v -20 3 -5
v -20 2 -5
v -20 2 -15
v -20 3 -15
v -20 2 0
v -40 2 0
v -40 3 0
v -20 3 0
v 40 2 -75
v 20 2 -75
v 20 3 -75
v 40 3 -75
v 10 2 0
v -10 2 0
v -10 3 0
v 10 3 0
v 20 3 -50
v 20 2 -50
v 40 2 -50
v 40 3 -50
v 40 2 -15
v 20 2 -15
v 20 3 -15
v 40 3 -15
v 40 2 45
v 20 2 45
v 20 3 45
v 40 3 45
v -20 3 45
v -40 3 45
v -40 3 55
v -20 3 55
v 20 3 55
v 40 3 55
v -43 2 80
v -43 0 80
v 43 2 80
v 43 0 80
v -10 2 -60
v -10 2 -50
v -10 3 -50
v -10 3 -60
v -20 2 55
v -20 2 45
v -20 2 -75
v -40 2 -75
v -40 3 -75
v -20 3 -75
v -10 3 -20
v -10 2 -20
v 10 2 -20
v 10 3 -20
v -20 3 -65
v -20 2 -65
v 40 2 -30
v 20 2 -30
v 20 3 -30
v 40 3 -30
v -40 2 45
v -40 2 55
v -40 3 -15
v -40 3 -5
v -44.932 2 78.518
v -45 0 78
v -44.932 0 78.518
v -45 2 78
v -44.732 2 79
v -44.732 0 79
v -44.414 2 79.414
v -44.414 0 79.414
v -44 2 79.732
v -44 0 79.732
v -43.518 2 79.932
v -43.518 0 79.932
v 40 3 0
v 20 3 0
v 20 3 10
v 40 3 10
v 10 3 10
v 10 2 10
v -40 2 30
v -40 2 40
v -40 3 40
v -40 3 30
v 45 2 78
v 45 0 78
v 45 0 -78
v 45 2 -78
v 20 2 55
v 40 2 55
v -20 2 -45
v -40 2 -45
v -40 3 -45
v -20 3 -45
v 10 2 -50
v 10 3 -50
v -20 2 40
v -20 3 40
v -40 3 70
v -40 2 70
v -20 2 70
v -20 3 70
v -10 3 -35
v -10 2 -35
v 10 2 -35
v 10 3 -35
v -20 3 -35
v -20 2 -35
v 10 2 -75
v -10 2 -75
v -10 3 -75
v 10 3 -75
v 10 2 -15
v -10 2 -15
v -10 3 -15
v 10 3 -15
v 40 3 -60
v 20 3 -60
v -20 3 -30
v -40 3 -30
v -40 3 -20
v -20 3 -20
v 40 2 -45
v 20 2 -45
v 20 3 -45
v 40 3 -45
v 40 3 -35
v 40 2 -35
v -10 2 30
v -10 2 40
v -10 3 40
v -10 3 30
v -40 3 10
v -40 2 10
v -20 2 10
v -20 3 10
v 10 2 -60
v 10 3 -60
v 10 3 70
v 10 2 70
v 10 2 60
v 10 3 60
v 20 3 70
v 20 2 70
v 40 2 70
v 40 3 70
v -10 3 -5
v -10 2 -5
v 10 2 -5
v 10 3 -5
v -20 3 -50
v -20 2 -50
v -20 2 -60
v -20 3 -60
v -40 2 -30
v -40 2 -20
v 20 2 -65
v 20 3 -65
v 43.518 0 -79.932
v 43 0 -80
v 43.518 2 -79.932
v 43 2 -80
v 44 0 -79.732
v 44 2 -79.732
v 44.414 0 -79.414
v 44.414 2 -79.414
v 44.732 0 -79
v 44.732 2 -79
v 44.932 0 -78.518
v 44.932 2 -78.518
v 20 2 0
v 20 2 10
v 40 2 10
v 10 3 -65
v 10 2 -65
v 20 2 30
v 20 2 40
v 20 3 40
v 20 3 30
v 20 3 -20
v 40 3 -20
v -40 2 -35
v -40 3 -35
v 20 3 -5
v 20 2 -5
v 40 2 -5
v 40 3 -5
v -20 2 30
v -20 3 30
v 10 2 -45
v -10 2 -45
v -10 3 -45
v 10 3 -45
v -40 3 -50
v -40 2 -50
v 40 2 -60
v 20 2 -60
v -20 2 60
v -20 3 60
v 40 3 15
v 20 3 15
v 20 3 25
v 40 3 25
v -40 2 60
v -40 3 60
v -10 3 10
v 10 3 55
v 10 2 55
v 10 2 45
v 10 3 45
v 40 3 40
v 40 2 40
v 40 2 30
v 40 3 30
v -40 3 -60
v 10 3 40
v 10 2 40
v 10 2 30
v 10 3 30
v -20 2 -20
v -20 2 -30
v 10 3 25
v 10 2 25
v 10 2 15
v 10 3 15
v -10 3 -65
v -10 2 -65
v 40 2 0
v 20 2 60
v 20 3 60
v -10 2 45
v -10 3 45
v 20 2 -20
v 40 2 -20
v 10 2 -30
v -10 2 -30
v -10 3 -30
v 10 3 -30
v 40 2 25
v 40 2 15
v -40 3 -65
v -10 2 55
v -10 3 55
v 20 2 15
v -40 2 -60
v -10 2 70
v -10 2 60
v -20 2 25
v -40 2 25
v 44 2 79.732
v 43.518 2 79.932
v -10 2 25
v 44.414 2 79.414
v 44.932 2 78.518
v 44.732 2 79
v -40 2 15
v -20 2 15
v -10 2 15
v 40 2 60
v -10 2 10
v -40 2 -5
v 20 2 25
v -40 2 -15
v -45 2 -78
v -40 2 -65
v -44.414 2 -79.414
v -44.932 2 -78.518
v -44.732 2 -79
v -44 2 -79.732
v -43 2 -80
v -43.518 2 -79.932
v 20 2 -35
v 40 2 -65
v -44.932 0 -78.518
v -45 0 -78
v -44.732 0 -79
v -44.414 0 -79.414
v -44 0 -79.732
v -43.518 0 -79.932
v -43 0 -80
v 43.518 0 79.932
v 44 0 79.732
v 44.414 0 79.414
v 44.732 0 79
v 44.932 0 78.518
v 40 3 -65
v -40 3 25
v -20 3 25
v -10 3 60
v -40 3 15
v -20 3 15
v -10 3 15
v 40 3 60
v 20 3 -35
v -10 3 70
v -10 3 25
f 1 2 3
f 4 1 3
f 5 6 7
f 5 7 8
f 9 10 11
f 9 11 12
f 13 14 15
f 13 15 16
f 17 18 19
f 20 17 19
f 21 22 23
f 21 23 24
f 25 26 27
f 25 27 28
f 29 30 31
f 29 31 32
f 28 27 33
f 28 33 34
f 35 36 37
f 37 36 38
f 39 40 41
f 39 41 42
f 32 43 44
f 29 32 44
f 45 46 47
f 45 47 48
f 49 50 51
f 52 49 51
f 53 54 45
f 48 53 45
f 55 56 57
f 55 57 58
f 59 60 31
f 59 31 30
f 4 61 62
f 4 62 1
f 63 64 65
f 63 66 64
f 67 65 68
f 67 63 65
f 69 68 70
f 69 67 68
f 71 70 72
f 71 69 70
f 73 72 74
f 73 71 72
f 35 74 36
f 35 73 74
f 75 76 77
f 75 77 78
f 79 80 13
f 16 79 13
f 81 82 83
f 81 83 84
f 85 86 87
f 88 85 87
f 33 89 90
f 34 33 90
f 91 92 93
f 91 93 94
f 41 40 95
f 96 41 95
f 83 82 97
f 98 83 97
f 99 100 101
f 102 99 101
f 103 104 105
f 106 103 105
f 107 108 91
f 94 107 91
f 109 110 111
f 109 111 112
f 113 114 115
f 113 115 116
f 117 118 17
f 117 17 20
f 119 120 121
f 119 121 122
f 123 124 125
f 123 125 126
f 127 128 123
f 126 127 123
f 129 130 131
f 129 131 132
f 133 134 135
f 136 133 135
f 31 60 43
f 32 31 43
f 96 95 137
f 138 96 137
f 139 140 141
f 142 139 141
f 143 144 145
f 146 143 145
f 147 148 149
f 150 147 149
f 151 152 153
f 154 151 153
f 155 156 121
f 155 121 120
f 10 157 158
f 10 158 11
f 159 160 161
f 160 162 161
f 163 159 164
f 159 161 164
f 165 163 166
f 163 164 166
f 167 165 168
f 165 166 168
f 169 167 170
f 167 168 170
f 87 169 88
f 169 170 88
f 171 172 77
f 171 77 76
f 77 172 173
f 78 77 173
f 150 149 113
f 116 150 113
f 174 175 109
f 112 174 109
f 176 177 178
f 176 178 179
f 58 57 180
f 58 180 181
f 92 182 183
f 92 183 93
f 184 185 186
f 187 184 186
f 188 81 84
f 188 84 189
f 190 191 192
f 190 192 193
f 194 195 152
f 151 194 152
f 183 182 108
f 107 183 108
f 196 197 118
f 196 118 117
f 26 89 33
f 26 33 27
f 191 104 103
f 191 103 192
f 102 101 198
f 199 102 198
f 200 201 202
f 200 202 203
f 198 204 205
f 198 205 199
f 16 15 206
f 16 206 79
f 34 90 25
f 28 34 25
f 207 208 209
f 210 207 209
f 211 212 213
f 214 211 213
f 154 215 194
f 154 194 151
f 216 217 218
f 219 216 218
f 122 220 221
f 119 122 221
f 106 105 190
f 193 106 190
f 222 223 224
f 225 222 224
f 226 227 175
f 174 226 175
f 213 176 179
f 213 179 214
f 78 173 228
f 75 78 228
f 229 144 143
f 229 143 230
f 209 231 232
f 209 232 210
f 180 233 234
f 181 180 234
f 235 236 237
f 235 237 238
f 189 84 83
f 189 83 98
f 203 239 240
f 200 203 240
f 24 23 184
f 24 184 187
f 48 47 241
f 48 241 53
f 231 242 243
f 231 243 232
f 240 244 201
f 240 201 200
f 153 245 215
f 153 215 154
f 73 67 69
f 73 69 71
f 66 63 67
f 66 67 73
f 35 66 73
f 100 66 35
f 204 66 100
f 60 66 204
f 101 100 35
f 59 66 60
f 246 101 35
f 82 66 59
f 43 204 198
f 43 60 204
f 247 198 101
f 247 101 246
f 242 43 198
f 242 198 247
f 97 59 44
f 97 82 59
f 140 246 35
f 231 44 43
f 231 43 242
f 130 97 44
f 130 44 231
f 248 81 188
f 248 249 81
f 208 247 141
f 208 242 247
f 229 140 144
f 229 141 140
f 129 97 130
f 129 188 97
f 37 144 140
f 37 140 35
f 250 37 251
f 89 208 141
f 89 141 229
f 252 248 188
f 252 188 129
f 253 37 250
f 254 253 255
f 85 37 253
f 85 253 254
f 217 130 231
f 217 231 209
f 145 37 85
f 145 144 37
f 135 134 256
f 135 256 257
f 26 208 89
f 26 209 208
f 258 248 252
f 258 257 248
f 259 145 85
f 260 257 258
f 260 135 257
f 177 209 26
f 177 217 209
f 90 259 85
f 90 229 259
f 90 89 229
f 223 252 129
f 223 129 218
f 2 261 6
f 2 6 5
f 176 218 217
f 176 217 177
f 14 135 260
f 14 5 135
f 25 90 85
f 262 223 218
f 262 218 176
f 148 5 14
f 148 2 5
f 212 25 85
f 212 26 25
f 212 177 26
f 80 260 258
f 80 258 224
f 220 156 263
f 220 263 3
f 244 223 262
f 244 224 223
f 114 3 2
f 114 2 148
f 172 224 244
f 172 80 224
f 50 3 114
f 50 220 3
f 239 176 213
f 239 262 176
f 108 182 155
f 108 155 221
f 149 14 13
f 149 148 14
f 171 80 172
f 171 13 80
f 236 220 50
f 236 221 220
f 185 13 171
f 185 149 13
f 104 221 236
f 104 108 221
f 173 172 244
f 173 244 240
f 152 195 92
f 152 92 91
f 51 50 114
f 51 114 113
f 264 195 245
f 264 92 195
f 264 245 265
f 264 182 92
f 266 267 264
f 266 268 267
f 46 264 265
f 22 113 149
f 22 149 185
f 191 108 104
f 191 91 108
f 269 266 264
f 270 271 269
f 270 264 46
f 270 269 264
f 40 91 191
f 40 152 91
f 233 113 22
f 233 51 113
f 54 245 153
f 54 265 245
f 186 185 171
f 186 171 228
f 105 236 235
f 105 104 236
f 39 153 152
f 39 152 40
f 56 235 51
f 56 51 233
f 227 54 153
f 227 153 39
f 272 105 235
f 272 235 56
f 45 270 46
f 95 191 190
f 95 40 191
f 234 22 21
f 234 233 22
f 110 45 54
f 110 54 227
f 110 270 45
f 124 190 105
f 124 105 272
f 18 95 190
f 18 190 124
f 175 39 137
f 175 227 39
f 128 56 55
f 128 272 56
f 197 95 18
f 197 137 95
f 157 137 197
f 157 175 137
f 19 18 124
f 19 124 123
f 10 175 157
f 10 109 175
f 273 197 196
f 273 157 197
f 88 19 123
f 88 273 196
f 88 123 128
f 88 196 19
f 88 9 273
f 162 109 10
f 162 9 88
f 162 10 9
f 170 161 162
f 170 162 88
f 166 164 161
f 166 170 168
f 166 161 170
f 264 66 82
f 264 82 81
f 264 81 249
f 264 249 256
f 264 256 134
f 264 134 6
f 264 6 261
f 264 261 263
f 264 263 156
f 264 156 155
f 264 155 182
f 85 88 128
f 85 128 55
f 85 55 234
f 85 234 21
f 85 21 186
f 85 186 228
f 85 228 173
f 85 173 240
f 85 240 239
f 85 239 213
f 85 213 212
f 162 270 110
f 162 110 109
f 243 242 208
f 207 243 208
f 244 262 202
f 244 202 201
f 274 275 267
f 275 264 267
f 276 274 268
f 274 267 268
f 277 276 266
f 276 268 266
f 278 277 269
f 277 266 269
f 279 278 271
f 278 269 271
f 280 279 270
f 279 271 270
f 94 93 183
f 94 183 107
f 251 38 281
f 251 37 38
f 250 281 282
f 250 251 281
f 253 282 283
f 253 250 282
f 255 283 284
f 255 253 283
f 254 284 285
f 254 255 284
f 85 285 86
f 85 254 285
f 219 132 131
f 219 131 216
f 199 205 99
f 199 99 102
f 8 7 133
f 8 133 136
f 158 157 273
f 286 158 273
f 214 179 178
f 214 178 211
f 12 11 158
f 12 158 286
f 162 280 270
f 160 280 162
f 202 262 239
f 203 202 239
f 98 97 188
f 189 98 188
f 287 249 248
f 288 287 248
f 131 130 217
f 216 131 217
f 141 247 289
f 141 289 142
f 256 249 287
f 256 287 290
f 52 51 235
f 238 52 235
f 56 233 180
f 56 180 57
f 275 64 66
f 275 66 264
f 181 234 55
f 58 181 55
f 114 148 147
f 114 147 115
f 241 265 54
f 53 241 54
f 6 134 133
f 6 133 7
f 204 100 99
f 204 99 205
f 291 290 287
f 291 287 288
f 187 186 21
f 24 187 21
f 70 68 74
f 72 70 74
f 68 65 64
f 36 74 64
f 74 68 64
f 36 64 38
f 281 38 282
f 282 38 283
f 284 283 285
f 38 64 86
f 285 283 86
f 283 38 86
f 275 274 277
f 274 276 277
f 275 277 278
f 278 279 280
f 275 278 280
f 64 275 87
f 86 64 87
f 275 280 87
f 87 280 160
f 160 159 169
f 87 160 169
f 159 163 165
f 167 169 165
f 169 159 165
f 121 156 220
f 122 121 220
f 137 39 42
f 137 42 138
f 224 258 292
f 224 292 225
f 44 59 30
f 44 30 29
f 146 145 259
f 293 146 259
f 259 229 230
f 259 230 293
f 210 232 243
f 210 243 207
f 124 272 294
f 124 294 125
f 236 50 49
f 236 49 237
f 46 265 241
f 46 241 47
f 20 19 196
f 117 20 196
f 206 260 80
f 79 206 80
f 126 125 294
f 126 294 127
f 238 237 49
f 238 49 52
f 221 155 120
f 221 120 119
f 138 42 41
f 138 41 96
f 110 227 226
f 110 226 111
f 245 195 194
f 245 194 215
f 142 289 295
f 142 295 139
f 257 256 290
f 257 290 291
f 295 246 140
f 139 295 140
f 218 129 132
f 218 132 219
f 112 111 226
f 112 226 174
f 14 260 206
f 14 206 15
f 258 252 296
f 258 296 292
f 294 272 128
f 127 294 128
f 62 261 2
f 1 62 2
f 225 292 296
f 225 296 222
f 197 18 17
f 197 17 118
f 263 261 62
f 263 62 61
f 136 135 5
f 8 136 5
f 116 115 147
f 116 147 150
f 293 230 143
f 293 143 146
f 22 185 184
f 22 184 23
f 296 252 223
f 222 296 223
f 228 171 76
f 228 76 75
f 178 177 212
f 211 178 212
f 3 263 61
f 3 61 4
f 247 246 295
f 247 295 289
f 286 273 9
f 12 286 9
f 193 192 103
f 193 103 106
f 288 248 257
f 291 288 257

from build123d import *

# Parameters (mm, degrees)
SKETCH1_W           = 90
SKETCH1_H           = 160
BOSS_EXTRUDE1_DEPTH = 2
SKETCH2_W           = 20
SKETCH2_H           = 10
BOSS_EXTRUDE2_DEPTH = 1
LPATTERN1_COUNT     = 3
LPATTERN1_PITCH     = 30
FILLET1_R           = 2


with BuildPart() as part:
    # Sketch1 → Boss-Extrude1 (new body)
    with BuildSketch(Plane(origin=(0, 0, 0), x_dir=(1, 0, 0), z_dir=(0, 1, 0))):
        Rectangle(SKETCH1_W, SKETCH1_H)
    extrude(amount=BOSS_EXTRUDE1_DEPTH)

    # Sketch2 → Boss-Extrude2 (add)
    with BuildSketch(Plane(origin=(0, 2, 0), x_dir=(1, 0, 0), z_dir=(0, 1, 0))):
        with Locations((-30, 70)):
            Rectangle(SKETCH2_W, SKETCH2_H)
        with Locations((-30, 55)):
            Rectangle(SKETCH2_W, SKETCH2_H)
        with Locations((-30, 40)):
            Rectangle(SKETCH2_W, SKETCH2_H)
        with Locations((-30, 25)):
            Rectangle(SKETCH2_W, SKETCH2_H)
        with Locations((-30, 10)):
            Rectangle(SKETCH2_W, SKETCH2_H)
        with Locations((-30, -5)):
            Rectangle(SKETCH2_W, SKETCH2_H)
        with Locations((-30, -20)):
            Rectangle(SKETCH2_W, SKETCH2_H)
        with Locations((-30, -35)):
            Rectangle(SKETCH2_W, SKETCH2_H)
        with Locations((-30, -50)):
            Rectangle(SKETCH2_W, SKETCH2_H)
        with Locations((-30, -65)):
            Rectangle(SKETCH2_W, SKETCH2_H)
    boss_extrude2 = extrude(amount=BOSS_EXTRUDE2_DEPTH)

    # LPattern1: Boss-Extrude2 ×3
    with Locations(*[(i * LPATTERN1_PITCH, 0, 0) for i in range(1, LPATTERN1_COUNT)]):
        add(boss_extrude2)

    # Fillet1
    fillet1_edges = [part.edges().sort_by_distance(p)[0] for p in [
        (-45, 1, -80),
        (45, 1, -80),
        (45, 1, 80),
        (-45, 1, 80),
    ]]
    fillet(fillet1_edges, radius=FILLET1_R)


solid = part.part
